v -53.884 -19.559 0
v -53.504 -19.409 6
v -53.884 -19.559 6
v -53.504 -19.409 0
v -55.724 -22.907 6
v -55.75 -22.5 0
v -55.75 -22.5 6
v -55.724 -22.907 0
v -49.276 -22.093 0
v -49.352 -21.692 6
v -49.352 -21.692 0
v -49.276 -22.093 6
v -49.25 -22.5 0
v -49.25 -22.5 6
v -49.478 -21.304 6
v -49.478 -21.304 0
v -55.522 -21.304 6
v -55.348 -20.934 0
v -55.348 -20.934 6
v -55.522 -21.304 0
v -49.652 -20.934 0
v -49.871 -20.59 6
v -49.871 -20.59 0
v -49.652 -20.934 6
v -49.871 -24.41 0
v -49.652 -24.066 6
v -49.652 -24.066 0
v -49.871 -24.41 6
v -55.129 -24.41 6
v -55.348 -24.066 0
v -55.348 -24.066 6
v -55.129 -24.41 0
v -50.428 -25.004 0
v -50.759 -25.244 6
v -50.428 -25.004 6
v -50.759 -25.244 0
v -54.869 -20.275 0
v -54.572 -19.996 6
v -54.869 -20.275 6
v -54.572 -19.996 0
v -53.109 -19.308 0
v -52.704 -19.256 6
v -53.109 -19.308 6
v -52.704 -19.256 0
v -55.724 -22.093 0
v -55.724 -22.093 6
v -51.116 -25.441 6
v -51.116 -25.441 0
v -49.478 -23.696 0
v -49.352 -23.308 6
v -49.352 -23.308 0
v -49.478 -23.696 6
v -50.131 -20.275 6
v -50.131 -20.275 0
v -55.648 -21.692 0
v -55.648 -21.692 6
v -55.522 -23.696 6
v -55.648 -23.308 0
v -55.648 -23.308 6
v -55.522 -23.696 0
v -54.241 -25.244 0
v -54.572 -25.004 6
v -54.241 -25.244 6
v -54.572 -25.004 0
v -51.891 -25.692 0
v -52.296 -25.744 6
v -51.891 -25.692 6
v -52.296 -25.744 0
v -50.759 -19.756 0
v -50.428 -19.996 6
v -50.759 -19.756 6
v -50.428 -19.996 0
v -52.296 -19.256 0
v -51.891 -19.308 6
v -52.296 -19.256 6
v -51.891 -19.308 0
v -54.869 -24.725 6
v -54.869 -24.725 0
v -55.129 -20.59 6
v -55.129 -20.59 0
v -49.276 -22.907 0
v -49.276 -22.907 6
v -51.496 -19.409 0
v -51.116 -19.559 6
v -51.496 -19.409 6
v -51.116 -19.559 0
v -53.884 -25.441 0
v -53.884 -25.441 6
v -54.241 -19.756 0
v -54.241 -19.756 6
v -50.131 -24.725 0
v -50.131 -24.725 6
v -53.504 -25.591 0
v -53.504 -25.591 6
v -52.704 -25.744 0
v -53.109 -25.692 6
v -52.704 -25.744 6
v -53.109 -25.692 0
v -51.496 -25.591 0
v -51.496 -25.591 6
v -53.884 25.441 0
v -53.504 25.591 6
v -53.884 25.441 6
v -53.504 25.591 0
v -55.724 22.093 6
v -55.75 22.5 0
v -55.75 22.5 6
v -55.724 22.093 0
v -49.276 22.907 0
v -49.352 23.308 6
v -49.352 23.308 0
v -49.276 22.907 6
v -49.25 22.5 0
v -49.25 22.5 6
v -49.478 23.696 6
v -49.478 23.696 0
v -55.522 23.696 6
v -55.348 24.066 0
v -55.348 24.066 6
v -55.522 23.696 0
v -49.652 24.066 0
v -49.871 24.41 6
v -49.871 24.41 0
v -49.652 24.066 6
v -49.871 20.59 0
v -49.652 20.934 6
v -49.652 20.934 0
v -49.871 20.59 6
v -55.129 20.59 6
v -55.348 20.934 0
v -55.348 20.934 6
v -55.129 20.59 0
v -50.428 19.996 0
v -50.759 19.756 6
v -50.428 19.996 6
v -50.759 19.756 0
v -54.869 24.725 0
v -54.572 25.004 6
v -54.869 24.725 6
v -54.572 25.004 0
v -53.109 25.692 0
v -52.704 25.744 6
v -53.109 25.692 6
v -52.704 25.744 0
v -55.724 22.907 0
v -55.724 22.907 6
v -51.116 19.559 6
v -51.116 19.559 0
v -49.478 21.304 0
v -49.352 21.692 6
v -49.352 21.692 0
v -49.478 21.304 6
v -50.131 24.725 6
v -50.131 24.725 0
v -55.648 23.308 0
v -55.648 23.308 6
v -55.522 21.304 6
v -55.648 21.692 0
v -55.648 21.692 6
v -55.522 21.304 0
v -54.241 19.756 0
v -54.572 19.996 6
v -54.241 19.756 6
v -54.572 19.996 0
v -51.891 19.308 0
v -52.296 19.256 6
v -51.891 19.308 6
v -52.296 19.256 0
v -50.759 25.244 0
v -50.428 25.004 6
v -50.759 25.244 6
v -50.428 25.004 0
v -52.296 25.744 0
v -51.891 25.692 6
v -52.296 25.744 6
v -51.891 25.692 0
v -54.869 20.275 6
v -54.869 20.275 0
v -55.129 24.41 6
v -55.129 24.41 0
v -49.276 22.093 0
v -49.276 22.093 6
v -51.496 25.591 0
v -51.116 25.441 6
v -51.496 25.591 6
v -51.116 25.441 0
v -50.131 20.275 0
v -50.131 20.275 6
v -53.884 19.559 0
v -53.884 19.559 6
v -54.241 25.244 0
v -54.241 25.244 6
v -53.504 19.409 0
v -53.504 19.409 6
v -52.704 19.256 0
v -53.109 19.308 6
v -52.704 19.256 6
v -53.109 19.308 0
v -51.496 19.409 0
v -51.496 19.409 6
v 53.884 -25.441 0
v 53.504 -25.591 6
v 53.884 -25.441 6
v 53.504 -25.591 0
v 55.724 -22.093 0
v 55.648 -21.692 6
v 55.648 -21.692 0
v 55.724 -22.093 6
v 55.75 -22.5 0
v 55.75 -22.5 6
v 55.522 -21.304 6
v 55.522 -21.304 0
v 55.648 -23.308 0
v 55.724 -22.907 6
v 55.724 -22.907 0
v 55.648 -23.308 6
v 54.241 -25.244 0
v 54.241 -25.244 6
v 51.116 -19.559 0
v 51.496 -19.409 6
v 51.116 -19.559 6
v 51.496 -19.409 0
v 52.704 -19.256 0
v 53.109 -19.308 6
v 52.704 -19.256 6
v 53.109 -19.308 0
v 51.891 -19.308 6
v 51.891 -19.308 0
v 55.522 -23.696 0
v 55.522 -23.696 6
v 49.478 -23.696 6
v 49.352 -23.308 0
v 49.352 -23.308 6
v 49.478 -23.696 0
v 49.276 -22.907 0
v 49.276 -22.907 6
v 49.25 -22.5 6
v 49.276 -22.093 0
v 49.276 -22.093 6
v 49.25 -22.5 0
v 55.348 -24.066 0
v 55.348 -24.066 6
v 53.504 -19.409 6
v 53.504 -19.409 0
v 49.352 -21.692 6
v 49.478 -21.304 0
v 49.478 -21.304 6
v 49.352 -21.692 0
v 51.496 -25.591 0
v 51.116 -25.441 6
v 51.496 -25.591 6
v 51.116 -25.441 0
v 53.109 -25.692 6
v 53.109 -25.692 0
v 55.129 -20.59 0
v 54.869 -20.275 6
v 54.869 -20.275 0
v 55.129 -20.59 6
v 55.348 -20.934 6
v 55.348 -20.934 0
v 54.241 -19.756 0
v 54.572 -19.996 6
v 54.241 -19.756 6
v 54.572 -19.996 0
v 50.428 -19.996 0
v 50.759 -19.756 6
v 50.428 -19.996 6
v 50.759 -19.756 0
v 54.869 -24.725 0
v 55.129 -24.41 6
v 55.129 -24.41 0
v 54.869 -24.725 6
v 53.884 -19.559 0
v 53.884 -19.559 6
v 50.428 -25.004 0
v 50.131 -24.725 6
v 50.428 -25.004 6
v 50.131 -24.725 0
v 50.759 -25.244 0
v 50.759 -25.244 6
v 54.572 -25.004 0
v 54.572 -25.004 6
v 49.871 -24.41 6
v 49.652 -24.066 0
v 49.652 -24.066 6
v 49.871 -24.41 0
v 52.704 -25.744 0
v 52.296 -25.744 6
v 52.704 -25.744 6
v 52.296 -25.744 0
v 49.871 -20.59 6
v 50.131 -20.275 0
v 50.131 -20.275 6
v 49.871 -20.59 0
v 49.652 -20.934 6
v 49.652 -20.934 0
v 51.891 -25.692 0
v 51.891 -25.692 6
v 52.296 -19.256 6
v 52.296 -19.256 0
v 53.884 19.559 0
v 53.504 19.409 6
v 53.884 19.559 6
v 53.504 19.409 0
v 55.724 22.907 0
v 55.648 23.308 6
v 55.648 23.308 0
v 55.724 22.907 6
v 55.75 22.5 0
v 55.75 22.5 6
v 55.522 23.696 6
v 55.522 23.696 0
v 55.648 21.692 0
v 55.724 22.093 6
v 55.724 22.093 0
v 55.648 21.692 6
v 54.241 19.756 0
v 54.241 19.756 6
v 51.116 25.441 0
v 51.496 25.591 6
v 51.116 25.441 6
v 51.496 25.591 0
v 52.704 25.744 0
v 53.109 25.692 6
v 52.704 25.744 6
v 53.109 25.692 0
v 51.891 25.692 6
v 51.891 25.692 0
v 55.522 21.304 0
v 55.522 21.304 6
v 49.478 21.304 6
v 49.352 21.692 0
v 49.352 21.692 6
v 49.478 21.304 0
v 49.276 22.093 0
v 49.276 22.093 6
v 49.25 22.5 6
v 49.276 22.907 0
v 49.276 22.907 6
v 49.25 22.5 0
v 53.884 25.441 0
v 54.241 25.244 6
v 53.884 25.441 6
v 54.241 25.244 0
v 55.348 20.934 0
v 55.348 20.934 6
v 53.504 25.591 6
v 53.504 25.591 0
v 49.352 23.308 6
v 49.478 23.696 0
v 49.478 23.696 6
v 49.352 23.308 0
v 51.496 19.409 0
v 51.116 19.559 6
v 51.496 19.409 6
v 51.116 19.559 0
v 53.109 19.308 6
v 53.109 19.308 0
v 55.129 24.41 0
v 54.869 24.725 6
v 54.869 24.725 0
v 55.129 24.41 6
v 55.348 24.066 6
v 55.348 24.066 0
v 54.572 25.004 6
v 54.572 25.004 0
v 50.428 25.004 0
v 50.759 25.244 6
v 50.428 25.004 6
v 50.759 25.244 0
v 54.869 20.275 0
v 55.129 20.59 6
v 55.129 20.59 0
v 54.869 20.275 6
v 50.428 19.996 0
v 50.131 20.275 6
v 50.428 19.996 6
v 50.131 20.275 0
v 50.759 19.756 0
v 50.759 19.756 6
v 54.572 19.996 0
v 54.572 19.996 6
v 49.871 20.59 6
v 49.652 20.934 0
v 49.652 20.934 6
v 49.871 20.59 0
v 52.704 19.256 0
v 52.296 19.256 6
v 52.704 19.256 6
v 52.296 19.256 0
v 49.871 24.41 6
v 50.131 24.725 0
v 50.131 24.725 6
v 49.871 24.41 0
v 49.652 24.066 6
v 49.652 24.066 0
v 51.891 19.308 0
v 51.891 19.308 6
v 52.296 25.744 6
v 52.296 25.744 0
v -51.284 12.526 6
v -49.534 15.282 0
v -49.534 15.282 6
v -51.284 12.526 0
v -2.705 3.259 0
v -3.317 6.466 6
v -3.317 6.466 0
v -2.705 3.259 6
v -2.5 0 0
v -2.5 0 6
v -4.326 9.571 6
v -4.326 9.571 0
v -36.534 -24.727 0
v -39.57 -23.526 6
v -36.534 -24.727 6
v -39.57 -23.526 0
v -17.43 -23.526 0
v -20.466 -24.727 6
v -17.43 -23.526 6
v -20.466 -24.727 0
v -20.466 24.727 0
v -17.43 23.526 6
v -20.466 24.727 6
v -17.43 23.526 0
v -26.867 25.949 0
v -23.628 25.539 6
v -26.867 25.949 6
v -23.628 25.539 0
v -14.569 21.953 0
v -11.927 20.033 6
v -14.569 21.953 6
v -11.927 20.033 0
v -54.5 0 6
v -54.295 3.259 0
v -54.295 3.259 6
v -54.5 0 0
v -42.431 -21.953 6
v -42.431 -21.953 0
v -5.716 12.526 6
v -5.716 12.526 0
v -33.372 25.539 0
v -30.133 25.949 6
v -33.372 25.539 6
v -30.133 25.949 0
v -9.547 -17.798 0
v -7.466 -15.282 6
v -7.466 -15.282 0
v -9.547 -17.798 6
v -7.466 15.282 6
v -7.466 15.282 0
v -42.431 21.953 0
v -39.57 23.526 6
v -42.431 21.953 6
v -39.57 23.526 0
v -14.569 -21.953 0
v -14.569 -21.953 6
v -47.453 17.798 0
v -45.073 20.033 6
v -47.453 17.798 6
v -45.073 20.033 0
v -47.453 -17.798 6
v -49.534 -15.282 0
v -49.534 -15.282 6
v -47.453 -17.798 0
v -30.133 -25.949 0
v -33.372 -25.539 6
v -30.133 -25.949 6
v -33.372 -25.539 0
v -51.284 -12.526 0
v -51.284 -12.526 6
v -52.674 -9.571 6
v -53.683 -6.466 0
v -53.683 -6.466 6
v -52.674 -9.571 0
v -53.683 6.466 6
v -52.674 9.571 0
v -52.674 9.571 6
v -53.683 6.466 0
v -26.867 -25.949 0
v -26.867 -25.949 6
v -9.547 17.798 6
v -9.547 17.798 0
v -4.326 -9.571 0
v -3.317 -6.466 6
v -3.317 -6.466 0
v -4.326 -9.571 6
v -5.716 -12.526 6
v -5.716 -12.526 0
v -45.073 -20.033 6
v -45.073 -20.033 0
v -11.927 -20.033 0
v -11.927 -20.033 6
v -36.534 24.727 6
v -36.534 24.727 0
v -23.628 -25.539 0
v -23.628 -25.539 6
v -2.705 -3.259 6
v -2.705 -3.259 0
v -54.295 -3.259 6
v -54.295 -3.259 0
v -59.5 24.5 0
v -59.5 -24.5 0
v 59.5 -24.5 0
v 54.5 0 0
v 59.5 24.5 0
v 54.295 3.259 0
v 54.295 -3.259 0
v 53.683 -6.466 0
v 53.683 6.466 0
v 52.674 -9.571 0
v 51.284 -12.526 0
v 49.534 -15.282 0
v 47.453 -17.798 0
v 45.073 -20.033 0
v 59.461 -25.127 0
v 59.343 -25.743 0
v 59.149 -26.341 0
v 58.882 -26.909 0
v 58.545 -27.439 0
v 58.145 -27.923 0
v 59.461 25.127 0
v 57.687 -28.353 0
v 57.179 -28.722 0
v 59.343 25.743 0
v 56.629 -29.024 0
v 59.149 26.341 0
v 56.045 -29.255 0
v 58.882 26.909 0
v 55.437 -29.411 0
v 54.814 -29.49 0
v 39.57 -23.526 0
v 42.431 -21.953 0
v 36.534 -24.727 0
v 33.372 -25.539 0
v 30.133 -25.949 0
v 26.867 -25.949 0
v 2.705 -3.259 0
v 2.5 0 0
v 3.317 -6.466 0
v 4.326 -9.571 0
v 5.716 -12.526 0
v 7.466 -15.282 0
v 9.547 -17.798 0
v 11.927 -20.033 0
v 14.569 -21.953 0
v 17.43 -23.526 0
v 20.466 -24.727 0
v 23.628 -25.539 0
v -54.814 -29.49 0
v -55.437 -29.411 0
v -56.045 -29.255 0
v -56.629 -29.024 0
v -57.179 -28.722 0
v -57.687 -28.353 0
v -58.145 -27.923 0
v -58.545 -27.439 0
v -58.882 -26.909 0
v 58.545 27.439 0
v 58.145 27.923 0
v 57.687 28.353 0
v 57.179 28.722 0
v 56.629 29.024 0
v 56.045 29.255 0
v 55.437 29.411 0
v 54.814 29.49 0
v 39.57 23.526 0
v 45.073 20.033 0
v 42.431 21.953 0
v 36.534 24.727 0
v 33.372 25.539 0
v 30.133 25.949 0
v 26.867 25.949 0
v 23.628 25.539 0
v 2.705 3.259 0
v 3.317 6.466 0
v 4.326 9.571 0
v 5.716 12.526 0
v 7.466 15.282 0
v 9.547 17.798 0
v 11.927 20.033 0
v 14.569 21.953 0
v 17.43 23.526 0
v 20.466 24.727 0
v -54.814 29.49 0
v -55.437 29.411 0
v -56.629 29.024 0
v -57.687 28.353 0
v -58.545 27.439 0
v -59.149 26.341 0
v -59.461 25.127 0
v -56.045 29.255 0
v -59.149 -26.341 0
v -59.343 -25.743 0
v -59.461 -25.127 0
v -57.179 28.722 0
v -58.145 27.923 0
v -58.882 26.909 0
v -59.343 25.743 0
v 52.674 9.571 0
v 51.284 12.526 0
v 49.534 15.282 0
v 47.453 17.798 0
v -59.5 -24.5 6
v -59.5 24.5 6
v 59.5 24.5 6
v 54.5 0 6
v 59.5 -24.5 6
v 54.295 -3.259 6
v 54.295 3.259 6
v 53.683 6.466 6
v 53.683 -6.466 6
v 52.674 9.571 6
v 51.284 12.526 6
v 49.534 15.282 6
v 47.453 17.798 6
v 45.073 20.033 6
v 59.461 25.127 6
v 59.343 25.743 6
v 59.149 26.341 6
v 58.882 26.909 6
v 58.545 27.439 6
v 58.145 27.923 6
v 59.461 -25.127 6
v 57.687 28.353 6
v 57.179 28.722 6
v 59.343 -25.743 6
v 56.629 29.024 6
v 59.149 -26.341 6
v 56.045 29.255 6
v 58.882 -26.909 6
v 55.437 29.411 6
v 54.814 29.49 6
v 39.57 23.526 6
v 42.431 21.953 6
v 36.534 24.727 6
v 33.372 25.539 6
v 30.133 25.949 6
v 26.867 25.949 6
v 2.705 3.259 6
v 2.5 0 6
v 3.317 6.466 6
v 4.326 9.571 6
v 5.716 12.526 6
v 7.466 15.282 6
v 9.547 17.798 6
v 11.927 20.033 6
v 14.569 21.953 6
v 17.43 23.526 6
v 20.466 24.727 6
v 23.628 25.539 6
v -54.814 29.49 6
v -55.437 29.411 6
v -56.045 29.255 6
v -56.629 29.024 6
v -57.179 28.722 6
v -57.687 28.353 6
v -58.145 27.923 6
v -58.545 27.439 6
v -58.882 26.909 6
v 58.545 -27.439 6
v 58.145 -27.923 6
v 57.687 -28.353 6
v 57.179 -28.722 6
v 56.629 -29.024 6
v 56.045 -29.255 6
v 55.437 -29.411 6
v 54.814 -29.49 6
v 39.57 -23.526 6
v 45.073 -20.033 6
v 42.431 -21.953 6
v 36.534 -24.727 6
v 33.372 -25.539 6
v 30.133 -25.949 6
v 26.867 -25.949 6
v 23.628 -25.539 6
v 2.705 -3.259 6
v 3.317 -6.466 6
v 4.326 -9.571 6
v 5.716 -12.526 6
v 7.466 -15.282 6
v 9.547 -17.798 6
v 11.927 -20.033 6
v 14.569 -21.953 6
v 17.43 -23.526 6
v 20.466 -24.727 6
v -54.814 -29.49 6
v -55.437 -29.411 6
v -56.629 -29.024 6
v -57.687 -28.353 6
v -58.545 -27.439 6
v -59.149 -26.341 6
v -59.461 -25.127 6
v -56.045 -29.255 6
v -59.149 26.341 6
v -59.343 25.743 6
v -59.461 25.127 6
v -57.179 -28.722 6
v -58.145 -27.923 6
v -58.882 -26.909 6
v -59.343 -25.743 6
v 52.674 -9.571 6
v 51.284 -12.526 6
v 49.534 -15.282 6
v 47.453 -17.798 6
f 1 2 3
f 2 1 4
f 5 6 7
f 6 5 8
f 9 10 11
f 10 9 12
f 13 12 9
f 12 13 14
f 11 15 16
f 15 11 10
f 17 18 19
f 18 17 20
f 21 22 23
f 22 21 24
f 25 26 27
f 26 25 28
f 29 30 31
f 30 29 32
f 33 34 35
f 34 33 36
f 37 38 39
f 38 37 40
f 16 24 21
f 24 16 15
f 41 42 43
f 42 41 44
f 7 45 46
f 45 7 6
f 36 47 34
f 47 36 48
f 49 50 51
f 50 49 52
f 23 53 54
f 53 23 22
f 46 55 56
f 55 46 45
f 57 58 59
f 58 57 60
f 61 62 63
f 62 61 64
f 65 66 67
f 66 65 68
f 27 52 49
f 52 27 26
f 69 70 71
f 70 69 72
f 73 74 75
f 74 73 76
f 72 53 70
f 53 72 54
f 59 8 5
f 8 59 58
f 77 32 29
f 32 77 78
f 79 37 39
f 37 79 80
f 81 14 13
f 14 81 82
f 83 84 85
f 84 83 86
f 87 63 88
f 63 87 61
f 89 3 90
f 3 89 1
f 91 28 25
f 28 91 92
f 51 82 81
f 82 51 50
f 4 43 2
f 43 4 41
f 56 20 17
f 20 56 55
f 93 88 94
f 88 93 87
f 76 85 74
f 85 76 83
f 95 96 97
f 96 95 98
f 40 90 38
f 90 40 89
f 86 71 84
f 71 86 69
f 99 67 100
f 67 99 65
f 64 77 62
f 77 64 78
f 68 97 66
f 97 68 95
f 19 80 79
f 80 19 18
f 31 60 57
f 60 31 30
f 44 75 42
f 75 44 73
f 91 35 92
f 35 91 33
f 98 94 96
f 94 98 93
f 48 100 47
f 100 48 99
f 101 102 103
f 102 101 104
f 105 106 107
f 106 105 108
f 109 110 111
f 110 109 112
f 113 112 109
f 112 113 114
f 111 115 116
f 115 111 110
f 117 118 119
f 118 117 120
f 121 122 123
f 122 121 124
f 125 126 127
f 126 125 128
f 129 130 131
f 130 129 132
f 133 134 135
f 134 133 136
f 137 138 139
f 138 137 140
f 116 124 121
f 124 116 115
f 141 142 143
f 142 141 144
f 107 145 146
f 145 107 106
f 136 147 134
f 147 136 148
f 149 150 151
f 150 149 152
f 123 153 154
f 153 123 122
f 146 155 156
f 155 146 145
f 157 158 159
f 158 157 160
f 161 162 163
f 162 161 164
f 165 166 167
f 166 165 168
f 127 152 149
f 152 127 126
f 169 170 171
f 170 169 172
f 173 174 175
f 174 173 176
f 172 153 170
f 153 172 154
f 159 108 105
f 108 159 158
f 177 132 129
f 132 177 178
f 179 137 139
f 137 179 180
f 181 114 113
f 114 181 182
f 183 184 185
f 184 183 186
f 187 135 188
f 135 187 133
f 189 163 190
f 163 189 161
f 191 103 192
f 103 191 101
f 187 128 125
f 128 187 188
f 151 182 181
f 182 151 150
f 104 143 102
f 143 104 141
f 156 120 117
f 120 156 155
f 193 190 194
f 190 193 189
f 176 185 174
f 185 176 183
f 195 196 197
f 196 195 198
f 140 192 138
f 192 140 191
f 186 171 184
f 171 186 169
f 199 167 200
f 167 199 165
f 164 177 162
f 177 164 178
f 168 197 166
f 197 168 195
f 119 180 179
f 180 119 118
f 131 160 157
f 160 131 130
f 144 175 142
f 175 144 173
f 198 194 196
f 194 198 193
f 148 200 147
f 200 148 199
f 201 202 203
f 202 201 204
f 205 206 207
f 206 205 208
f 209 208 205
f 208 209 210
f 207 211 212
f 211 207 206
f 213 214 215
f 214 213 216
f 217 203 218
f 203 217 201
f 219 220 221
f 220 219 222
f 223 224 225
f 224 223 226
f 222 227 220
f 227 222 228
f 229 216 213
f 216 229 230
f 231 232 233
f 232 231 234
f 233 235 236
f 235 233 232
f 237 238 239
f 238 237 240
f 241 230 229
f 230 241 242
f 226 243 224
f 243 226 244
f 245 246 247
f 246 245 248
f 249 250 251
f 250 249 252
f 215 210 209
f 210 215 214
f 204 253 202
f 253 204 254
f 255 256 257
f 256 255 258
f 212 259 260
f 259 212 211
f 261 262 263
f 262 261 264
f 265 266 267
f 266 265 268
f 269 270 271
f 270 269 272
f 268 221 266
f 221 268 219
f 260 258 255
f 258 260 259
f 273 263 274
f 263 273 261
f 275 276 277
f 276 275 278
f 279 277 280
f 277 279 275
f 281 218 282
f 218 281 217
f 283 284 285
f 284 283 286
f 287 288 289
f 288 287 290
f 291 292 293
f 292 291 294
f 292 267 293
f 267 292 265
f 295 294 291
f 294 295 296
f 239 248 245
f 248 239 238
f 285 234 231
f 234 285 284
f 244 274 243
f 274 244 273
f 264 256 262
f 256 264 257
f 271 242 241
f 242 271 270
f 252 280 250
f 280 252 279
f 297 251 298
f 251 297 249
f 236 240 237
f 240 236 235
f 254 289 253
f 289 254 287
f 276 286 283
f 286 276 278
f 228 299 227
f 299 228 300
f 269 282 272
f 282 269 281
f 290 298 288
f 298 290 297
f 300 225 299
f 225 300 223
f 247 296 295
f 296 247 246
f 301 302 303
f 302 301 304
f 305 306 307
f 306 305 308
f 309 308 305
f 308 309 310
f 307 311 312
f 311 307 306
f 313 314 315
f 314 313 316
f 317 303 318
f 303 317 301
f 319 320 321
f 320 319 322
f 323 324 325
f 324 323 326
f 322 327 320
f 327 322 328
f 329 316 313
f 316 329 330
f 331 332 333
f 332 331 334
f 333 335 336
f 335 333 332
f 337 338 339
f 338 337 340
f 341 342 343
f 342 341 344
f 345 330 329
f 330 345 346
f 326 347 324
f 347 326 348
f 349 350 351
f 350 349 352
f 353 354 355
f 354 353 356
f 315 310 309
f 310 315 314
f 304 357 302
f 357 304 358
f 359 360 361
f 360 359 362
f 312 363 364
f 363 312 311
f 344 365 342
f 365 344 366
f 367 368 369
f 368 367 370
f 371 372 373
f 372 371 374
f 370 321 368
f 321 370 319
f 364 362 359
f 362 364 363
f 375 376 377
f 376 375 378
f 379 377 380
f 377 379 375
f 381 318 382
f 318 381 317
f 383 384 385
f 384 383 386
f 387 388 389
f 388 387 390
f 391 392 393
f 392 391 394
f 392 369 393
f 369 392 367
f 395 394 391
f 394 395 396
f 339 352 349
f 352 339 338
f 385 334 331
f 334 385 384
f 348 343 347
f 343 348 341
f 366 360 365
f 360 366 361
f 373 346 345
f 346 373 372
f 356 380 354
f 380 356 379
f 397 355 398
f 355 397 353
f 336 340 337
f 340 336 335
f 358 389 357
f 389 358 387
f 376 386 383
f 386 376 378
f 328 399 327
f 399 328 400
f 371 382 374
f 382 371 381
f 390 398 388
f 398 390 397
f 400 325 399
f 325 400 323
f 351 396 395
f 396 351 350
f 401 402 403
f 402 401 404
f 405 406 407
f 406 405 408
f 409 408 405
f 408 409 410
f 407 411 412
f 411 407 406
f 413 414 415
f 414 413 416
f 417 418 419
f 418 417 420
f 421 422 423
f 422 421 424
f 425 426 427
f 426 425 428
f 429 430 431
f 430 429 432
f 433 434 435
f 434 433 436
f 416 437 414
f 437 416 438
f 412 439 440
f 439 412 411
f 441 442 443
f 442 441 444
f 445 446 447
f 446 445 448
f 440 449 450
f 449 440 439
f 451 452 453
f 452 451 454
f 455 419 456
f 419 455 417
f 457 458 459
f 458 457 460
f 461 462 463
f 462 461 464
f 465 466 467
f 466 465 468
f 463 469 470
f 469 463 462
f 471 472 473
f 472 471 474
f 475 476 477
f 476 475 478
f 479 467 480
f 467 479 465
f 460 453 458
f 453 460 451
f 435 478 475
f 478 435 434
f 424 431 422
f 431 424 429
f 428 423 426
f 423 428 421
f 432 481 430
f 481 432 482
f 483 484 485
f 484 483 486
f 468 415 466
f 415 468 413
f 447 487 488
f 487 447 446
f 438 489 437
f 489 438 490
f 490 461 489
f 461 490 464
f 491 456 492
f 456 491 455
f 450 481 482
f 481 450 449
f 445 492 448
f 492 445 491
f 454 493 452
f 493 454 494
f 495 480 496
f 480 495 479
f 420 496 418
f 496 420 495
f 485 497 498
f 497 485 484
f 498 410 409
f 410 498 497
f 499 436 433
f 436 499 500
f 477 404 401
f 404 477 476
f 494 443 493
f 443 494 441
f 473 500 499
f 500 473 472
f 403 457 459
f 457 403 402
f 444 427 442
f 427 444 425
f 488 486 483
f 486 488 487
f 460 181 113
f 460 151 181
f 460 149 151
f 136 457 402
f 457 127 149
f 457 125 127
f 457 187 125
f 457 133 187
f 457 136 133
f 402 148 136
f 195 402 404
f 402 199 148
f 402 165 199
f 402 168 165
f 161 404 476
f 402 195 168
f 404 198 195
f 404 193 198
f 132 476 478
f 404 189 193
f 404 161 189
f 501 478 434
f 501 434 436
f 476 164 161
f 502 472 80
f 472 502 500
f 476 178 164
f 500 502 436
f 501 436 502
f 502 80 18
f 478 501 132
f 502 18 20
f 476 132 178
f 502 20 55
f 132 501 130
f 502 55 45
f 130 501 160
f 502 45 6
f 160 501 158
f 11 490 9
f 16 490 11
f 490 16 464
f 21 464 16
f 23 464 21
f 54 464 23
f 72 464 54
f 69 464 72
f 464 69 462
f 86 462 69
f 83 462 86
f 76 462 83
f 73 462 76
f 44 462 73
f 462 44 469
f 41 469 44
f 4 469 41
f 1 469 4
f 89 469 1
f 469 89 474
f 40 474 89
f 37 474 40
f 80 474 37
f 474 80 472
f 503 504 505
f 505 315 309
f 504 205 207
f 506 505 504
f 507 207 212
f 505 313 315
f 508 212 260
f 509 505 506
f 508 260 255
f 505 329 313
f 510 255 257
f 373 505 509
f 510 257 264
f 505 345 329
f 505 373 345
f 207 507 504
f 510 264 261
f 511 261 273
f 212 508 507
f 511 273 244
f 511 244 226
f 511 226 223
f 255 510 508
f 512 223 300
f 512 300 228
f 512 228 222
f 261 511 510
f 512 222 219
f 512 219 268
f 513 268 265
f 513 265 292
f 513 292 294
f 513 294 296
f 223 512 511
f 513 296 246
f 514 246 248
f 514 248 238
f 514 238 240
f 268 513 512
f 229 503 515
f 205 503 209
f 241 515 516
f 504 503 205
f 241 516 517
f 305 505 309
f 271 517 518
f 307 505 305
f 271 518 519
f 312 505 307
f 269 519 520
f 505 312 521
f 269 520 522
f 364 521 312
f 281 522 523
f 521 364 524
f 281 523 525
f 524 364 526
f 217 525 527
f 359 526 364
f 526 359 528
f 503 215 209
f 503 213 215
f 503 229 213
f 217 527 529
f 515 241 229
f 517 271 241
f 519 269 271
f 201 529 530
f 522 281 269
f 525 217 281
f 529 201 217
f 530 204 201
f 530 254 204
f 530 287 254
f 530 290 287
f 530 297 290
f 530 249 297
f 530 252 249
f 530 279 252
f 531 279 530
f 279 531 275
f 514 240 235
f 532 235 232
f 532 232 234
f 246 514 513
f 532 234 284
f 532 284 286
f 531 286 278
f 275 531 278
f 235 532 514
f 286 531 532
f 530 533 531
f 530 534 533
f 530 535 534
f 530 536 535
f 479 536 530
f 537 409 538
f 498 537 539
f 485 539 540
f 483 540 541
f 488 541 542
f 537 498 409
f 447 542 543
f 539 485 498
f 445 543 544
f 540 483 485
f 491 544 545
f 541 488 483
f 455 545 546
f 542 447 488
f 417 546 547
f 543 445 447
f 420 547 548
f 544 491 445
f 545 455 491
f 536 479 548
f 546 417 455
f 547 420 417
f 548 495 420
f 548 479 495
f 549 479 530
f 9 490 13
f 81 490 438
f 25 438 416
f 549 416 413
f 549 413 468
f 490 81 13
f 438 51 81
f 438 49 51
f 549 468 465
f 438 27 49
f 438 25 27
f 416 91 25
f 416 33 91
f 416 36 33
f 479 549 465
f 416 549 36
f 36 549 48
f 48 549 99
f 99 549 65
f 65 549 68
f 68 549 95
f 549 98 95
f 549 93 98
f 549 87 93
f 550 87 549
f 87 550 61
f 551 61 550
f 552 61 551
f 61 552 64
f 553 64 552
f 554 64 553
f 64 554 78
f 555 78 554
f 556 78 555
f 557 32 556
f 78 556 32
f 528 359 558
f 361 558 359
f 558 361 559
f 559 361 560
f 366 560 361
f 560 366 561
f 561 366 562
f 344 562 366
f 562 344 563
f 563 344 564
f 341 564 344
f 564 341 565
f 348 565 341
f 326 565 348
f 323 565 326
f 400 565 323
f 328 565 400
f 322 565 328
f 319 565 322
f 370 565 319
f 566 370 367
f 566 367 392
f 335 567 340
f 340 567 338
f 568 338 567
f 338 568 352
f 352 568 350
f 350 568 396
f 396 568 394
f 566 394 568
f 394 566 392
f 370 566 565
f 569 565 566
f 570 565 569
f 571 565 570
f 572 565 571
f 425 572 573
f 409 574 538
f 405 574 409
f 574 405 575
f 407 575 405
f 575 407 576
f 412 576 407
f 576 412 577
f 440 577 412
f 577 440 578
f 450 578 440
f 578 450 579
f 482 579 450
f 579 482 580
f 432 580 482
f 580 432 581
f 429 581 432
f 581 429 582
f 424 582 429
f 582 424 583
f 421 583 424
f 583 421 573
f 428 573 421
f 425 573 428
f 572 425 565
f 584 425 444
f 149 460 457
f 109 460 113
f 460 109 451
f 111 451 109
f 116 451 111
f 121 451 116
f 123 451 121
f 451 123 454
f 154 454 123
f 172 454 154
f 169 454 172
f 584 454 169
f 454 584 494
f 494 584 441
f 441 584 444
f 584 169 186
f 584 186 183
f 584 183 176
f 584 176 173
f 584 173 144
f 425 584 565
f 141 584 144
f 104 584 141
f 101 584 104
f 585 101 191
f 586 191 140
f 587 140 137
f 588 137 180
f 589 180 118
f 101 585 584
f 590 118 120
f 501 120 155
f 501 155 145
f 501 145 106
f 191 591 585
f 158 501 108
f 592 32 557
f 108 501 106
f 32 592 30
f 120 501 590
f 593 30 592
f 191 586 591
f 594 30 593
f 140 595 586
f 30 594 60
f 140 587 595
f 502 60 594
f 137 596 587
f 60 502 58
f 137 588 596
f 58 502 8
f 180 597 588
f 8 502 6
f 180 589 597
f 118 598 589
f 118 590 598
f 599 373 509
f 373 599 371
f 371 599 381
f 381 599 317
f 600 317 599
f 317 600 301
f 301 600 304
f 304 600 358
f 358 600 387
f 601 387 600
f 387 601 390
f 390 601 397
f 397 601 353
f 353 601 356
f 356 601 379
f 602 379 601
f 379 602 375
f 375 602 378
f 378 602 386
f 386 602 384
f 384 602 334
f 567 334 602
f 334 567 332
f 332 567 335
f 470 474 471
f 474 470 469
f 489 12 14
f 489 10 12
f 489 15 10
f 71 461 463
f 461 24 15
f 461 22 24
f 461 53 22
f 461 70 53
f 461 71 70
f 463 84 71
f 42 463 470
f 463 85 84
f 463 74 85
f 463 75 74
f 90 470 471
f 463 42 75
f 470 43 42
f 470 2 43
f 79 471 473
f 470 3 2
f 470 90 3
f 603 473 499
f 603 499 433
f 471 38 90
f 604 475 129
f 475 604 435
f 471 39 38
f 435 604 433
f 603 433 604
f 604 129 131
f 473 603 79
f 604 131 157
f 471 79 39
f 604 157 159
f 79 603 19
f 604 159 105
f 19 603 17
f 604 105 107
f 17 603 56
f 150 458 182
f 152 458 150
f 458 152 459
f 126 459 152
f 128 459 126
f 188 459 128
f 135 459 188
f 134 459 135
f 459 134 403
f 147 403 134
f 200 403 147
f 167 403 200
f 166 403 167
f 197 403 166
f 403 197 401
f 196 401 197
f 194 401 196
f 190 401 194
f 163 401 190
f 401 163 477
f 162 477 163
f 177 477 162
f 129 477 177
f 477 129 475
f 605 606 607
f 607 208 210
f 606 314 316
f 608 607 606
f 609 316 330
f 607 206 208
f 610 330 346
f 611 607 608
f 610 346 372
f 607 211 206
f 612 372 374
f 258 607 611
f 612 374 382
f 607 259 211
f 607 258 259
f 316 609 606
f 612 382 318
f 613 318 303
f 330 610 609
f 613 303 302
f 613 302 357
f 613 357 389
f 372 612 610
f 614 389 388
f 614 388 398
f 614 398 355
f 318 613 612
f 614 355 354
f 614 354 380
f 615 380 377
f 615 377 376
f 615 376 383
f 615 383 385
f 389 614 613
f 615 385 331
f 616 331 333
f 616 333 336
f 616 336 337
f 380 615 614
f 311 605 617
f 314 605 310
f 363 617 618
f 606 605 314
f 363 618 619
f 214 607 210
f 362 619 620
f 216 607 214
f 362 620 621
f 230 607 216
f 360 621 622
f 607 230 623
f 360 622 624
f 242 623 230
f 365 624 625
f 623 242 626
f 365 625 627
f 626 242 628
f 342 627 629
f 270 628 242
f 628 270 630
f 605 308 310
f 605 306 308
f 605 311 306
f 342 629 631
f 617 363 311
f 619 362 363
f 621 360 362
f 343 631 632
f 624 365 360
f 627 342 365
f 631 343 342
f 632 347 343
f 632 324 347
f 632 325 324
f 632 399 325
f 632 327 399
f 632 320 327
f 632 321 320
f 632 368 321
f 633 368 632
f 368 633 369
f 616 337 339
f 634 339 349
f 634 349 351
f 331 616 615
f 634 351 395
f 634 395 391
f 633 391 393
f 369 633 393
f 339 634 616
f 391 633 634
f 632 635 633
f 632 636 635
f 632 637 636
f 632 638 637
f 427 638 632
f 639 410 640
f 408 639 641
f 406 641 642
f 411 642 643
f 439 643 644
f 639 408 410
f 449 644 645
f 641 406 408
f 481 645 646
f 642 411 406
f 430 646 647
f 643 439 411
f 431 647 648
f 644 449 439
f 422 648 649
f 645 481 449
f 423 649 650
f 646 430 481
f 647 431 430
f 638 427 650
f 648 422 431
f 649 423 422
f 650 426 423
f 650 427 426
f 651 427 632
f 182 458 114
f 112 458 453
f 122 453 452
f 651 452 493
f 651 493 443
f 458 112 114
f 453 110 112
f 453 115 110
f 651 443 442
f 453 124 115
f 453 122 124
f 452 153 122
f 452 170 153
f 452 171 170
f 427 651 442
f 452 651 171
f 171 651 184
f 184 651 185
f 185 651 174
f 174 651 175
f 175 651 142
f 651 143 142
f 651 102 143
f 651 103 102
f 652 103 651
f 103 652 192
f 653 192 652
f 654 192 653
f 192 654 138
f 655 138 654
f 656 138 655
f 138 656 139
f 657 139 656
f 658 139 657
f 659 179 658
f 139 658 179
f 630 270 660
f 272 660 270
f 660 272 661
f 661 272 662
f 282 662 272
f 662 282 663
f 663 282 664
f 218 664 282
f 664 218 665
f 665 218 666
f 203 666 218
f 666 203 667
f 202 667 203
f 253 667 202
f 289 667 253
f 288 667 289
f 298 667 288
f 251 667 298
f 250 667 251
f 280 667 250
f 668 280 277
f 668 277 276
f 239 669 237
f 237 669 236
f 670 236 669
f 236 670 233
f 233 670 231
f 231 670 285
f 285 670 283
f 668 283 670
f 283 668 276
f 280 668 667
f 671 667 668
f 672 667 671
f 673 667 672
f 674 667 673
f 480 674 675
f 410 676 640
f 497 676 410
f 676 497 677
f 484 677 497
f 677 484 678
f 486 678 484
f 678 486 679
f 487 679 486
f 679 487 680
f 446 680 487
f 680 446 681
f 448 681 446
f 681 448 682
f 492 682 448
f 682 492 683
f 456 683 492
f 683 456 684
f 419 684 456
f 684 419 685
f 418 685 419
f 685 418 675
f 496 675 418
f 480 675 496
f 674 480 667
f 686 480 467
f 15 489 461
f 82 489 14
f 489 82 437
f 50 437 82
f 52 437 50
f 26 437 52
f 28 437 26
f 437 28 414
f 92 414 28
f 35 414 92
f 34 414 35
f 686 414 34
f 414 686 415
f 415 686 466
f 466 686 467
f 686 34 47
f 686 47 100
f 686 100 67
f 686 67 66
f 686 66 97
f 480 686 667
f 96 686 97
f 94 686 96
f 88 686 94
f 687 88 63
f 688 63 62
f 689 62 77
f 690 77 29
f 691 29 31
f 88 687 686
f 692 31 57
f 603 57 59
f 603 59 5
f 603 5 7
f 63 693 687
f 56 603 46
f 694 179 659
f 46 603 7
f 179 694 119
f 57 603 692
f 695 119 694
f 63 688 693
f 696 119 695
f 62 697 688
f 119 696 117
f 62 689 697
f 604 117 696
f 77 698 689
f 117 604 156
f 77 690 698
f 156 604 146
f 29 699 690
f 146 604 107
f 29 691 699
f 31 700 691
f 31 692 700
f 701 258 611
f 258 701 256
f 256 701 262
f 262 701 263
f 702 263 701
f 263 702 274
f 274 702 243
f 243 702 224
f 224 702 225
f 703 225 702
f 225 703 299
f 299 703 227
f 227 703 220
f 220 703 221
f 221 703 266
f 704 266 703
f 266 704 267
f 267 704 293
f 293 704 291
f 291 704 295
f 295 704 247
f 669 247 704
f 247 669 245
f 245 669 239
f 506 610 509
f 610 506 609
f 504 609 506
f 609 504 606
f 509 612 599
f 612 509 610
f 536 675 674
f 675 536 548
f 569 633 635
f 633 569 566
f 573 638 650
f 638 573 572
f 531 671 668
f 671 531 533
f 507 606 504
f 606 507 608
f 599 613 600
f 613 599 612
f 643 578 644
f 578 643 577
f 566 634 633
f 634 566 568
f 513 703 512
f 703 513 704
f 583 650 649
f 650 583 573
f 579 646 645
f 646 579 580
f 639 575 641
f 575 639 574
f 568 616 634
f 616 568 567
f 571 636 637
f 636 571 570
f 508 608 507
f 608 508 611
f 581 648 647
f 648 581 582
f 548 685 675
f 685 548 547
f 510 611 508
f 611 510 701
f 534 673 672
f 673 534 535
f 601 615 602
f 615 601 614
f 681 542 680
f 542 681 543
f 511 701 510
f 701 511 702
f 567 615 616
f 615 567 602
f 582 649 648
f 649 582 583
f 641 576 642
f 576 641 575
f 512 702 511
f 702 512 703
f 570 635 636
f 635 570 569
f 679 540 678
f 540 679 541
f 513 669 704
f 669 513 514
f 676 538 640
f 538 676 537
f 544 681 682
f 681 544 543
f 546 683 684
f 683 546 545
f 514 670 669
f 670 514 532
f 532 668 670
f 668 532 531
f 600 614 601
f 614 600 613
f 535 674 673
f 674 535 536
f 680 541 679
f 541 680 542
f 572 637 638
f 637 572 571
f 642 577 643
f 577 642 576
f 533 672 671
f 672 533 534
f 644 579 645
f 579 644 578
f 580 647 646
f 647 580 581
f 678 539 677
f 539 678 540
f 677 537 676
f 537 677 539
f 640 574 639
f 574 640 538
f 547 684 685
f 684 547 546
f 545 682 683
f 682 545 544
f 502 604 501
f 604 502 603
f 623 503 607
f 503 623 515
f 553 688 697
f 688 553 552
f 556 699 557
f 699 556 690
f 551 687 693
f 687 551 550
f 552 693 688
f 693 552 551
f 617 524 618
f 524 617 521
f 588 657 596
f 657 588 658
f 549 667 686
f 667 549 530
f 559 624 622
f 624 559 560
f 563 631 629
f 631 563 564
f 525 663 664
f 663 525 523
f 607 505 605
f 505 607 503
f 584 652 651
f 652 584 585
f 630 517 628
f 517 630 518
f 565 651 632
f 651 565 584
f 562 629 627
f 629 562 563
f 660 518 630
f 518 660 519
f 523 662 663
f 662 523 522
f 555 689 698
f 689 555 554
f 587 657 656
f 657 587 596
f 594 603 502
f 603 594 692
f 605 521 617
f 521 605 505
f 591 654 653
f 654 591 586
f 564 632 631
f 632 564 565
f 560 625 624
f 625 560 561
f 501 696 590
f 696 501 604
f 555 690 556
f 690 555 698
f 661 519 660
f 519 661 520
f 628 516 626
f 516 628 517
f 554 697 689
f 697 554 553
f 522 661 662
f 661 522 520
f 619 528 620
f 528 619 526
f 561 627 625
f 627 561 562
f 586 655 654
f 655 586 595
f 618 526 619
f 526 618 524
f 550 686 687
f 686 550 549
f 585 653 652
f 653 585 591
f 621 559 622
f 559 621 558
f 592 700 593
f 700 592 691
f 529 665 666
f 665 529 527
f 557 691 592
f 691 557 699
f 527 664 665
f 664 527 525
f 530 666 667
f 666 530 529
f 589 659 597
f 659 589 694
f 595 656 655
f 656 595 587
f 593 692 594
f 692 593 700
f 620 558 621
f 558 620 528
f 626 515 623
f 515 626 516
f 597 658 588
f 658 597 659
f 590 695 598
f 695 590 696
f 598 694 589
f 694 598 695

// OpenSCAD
$fn = 50;

difference() {
	union() {
		hull() {
			translate(v = [-54.5, 24.5, 0]) {
				cylinder(h = 6, r = 5);
			}
			translate(v = [54.5, 24.5, 0]) {
				cylinder(h = 6, r = 5);
			}
			translate(v = [-54.5, -24.5, 0]) {
				cylinder(h = 6, r = 5);
			}
			translate(v = [54.5, -24.5, 0]) {
				cylinder(h = 6, r = 5);
			}
		}
	}
	union() {
		translate(v = [-52.5, -22.5, -100.0]) {
			cylinder(h = 200, r = 3.25);
		}
		translate(v = [-52.5, 22.5, -100.0]) {
			cylinder(h = 200, r = 3.25);
		}
		translate(v = [52.5, -22.5, -100.0]) {
			cylinder(h = 200, r = 3.25);
		}
		translate(v = [52.5, 22.5, -100.0]) {
			cylinder(h = 200, r = 3.25);
		}
		translate(v = [-52.5, -22.5, -100.0]) {
			cylinder(h = 200, r = 1.8);
		}
		translate(v = [-52.5, 22.5, -100.0]) {
			cylinder(h = 200, r = 1.8);
		}
		translate(v = [52.5, -22.5, -100.0]) {
			cylinder(h = 200, r = 1.8);
		}
		translate(v = [52.5, 22.5, -100.0]) {
			cylinder(h = 200, r = 1.8);
		}
		translate(v = [-28.5, 0, 0.0]) {
			cylinder(h = 6, r = 26.0);
		}
		translate(v = [28.5, 0, 0.0]) {
			cylinder(h = 6, r = 26.0);
		}
	}
}
